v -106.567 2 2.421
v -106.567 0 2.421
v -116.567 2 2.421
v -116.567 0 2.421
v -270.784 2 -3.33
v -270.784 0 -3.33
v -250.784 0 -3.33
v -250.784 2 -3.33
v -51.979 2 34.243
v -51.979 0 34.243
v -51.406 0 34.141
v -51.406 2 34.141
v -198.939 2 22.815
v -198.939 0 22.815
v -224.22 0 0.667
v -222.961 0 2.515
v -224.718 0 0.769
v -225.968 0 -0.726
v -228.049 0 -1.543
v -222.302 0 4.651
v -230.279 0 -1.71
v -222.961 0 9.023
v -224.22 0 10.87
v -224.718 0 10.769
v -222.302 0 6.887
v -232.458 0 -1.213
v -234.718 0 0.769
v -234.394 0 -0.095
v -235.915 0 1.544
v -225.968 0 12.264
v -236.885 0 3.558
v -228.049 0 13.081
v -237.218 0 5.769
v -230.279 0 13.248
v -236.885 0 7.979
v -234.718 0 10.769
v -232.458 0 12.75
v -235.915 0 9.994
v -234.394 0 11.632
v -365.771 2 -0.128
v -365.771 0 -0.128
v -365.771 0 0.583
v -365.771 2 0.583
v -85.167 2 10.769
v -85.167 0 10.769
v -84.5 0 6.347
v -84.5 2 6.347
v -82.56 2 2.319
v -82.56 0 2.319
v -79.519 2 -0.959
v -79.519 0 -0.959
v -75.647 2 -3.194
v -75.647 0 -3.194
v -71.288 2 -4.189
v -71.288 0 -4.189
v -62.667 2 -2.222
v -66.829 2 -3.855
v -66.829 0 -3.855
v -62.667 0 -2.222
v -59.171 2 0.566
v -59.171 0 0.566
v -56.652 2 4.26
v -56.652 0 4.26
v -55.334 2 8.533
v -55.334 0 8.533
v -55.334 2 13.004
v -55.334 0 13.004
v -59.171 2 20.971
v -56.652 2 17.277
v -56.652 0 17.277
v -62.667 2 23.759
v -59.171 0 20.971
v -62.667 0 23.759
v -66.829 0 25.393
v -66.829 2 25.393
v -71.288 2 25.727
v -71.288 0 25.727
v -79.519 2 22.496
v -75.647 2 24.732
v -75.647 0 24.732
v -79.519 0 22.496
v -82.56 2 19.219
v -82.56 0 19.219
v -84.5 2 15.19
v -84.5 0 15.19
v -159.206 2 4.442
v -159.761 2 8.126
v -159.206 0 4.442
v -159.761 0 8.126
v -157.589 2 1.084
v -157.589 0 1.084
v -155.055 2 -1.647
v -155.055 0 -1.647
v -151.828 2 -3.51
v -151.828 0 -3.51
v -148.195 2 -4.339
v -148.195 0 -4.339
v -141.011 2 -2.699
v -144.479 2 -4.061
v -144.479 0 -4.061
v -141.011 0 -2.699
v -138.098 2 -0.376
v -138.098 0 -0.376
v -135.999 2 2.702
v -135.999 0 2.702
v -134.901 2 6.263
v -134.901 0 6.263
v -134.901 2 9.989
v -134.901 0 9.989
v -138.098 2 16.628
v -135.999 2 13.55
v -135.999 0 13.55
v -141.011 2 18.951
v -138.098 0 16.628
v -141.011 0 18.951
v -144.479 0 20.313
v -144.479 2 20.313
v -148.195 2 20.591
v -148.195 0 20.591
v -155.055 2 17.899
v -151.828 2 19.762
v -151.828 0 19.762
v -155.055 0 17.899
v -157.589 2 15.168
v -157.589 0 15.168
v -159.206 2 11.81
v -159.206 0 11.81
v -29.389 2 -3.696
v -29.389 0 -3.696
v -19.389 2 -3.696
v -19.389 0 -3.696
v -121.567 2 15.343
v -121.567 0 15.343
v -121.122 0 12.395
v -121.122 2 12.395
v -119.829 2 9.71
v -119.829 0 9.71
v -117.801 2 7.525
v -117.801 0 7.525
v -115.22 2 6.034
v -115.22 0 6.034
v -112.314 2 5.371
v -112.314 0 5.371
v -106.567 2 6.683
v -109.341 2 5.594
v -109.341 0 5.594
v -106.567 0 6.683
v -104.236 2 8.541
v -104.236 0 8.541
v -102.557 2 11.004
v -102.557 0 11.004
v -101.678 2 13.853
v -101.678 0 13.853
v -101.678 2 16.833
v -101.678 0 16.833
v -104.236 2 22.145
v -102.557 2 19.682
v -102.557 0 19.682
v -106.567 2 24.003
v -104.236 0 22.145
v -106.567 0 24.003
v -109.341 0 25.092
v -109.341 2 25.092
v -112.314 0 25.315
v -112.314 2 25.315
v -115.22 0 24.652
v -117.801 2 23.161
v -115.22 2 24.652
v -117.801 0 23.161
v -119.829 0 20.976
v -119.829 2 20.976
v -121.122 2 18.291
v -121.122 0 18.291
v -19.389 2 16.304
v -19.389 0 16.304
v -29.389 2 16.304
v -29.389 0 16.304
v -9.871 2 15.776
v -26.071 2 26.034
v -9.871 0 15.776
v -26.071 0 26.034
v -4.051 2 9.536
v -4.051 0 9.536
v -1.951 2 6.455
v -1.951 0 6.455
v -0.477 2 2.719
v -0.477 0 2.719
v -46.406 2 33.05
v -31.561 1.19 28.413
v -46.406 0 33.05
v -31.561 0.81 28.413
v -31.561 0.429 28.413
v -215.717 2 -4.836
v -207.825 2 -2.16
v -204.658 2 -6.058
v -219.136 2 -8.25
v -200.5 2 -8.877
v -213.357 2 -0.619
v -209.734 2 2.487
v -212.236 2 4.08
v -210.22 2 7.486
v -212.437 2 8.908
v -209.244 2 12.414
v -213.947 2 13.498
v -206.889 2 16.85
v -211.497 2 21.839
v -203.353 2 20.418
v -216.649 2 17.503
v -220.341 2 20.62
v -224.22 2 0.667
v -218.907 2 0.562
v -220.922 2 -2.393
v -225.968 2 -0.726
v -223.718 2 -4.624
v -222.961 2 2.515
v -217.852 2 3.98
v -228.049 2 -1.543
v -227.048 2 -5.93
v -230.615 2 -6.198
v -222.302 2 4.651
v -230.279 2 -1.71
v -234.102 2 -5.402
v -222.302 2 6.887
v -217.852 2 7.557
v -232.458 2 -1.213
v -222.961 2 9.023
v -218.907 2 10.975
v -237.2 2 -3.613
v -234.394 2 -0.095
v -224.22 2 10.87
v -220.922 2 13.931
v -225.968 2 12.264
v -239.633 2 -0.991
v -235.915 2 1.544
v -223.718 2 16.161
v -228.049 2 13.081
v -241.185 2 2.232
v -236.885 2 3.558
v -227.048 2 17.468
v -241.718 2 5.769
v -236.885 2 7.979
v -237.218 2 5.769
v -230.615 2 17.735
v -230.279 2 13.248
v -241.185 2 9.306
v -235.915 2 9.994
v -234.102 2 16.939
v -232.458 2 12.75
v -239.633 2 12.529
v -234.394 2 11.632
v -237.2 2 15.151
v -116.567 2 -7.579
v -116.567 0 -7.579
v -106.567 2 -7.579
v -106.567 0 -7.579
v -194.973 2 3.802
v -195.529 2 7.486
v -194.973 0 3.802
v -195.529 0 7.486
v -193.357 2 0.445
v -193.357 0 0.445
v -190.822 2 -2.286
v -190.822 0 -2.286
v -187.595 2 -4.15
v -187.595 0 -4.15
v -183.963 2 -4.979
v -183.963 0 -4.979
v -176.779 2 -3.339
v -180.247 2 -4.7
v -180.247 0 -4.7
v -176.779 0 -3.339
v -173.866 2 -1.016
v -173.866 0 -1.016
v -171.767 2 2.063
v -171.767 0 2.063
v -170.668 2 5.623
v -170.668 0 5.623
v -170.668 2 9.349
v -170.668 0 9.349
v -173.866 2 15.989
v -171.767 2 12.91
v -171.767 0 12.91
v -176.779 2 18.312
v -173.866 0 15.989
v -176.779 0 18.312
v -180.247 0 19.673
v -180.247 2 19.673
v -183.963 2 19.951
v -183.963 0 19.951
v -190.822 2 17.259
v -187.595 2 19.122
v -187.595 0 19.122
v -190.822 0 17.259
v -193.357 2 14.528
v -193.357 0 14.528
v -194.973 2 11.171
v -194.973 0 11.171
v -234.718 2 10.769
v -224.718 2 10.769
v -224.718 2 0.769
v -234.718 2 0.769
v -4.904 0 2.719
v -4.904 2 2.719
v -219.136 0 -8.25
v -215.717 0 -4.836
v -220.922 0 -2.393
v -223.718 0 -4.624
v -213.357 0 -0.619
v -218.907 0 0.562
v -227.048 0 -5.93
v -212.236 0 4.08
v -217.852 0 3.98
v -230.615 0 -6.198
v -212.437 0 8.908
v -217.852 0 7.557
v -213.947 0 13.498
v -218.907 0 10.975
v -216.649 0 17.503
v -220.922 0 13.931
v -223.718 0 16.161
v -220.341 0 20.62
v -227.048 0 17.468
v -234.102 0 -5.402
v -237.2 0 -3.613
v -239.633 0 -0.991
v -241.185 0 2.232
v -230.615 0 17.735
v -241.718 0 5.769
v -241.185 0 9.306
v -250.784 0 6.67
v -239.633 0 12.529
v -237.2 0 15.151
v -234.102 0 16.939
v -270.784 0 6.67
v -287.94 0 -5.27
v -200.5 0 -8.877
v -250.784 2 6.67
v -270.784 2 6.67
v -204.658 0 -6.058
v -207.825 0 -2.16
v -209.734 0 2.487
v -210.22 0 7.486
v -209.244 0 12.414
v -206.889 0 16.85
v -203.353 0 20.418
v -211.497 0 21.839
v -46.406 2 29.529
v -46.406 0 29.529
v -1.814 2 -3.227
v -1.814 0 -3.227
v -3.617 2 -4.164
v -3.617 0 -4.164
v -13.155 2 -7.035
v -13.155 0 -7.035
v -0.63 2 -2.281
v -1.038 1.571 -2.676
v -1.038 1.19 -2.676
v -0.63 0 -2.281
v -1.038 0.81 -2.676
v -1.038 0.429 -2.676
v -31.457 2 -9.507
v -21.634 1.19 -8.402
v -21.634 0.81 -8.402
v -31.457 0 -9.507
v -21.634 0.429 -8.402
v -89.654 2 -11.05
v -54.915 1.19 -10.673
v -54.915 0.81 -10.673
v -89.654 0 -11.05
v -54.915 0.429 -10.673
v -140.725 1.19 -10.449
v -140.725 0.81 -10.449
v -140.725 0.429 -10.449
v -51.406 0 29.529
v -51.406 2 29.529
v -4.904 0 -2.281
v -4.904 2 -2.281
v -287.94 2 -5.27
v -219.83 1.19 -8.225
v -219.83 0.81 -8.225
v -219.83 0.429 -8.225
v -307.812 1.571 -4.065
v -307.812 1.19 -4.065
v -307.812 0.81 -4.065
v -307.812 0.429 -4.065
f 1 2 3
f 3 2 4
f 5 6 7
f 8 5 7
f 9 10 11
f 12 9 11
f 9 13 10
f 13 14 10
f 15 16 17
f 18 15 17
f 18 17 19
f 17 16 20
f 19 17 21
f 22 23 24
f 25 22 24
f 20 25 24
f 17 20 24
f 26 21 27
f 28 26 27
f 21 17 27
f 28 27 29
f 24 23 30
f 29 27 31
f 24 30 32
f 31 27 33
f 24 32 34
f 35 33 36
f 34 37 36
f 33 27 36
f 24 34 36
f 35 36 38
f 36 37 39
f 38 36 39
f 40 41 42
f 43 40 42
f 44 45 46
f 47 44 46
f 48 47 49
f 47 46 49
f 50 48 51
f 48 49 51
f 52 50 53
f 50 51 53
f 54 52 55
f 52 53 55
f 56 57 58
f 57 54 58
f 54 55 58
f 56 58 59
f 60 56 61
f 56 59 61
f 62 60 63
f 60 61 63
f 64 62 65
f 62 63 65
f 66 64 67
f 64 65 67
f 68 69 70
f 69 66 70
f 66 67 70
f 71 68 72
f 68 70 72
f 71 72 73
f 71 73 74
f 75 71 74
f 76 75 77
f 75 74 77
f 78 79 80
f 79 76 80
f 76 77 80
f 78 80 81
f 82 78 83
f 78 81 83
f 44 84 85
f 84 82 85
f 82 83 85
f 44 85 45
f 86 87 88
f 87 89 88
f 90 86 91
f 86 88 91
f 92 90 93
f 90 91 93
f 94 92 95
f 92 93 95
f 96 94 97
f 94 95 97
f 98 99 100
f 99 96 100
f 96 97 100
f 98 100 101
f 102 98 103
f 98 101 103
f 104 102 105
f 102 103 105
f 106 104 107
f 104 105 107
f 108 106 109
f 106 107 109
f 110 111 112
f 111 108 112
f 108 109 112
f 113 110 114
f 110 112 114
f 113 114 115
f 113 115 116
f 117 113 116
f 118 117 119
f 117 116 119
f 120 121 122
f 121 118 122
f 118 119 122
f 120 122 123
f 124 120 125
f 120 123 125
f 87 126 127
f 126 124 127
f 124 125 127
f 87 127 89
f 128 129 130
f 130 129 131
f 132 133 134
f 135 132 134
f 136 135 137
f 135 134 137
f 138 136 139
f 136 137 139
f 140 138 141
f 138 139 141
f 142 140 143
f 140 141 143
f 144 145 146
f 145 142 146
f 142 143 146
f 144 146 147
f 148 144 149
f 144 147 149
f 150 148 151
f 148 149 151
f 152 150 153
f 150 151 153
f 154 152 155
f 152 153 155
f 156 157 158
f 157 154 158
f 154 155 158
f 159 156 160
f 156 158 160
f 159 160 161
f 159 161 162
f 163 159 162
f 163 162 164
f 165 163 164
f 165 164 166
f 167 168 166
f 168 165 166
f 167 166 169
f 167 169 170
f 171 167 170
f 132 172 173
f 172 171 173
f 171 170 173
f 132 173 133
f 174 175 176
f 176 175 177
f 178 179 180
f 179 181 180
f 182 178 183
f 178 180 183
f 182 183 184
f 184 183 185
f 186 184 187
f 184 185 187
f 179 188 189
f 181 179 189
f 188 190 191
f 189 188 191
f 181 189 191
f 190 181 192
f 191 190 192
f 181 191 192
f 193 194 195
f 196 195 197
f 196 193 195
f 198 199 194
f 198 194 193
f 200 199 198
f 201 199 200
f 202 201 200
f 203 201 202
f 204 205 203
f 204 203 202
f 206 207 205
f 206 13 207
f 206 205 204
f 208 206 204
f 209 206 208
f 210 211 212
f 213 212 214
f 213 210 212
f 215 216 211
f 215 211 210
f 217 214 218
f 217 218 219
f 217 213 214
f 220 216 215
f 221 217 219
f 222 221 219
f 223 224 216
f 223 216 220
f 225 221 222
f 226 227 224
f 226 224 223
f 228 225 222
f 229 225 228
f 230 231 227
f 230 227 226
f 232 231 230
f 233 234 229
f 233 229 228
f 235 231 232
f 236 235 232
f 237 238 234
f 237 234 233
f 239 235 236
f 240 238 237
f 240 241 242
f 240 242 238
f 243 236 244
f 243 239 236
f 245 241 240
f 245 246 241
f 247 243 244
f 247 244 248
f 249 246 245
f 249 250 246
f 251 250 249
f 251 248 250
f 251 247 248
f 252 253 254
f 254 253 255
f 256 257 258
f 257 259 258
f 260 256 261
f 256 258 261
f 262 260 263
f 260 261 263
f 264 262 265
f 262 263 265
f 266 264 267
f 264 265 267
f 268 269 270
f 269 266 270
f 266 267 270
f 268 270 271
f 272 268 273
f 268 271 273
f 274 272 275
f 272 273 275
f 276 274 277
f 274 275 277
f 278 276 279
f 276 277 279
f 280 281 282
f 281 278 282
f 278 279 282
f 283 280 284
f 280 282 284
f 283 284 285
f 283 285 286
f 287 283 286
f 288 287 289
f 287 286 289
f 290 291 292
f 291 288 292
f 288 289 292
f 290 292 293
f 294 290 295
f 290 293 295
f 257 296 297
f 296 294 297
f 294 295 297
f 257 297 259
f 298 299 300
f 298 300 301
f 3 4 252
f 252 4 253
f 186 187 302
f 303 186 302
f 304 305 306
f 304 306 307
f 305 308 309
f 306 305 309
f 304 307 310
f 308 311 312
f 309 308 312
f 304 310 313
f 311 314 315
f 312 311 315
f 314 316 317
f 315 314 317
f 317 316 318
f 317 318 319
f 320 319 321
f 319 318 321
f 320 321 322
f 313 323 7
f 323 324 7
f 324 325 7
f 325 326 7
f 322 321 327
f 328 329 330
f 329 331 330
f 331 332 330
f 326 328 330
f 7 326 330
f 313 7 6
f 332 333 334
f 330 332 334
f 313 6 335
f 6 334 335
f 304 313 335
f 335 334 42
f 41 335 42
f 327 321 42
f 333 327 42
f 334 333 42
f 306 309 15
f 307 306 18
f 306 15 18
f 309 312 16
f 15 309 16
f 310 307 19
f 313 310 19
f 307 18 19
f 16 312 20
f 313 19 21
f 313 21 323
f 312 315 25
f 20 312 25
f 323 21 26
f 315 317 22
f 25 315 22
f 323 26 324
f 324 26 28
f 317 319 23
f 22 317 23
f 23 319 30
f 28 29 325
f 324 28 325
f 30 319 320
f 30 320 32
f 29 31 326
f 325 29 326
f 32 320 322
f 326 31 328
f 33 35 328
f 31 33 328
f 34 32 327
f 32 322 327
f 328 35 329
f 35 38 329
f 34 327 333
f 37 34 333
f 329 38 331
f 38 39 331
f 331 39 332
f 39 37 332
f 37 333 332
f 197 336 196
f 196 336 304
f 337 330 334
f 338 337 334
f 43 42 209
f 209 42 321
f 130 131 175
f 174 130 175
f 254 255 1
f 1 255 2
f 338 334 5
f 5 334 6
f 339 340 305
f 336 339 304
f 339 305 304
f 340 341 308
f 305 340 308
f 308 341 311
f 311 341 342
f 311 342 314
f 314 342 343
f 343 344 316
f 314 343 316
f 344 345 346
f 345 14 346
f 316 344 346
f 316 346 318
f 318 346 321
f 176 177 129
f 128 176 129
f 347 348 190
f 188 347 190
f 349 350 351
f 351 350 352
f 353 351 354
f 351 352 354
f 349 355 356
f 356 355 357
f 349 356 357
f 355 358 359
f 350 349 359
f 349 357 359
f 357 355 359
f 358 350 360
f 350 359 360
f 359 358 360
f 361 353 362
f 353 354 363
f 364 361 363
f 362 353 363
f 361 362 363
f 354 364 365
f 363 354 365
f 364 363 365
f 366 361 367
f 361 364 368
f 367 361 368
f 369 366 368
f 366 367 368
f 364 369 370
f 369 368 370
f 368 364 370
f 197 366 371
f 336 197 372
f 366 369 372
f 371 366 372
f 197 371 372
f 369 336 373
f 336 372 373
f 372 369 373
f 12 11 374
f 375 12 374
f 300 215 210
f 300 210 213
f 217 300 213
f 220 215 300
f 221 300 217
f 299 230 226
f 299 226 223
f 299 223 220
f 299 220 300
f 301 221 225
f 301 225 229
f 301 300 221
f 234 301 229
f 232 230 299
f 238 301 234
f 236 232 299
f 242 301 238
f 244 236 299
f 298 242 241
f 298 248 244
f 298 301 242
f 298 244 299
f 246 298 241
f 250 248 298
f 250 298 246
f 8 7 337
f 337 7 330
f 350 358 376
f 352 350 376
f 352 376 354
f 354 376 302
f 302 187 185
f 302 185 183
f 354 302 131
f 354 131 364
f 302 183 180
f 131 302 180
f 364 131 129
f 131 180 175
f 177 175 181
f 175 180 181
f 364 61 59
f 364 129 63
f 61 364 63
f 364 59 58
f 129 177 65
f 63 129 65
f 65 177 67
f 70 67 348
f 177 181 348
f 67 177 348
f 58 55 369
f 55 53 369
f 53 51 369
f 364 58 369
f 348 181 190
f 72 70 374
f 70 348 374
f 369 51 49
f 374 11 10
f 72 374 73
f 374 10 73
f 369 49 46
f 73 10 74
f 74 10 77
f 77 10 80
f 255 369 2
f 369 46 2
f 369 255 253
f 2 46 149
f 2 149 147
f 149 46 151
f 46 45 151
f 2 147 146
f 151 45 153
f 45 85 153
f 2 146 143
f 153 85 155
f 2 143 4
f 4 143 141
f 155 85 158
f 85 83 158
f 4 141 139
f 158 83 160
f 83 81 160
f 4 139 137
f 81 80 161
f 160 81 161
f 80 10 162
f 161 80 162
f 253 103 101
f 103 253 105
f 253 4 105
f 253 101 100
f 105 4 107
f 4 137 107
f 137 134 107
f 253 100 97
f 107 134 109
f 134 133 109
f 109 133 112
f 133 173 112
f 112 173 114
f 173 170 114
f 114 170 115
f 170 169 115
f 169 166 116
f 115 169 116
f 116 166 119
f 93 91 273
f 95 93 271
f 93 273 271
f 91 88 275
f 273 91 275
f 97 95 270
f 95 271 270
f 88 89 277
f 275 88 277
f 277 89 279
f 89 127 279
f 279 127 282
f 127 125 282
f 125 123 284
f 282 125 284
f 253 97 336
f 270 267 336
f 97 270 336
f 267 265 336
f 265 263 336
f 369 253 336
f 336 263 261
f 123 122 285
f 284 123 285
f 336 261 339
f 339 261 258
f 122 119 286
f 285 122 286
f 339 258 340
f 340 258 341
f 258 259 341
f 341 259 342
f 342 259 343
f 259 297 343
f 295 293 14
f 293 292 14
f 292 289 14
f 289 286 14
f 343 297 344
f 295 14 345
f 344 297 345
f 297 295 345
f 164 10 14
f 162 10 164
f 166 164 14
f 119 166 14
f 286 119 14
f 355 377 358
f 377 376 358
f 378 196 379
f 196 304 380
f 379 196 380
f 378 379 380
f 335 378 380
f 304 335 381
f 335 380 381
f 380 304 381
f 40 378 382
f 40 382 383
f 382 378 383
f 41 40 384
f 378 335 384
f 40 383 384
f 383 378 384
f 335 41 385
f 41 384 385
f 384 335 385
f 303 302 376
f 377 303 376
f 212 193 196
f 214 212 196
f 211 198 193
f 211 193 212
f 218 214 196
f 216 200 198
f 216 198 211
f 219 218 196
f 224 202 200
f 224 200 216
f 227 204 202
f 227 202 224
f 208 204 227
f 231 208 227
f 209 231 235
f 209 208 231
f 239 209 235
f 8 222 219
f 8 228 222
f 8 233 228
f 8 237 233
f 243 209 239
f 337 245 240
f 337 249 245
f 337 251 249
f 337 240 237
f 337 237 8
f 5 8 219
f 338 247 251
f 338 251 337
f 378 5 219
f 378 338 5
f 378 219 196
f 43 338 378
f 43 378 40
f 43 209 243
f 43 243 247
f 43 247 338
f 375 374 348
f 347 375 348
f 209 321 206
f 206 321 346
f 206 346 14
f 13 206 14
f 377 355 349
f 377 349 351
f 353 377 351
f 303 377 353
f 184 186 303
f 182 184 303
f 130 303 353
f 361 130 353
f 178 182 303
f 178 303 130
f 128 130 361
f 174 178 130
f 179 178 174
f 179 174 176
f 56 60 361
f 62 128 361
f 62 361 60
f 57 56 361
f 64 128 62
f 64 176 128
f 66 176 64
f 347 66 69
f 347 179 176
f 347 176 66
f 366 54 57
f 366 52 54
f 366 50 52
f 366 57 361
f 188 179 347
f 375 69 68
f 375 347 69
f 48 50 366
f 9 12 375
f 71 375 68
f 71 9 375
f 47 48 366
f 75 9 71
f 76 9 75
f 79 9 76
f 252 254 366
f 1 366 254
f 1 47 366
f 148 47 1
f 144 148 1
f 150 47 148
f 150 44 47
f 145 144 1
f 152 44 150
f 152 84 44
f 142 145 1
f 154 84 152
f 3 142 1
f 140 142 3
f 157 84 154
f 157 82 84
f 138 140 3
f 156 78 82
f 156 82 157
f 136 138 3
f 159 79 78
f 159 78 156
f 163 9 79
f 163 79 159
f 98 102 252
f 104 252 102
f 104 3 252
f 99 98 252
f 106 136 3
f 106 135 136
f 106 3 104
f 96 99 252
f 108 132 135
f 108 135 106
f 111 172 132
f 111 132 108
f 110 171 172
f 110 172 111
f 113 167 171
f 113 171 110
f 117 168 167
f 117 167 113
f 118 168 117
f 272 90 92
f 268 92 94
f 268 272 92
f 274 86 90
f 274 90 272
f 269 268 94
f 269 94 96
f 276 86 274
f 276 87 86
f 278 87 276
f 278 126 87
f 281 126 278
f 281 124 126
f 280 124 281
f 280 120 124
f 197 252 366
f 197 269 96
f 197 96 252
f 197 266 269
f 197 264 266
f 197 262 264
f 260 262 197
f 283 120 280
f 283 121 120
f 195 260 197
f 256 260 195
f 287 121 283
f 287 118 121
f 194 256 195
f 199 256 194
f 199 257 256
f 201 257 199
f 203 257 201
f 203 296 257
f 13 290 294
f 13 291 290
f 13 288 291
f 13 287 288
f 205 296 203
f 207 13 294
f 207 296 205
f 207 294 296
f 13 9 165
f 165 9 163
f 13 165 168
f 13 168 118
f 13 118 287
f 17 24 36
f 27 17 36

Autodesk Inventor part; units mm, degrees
ref_plane "YZ Plane" through (0, 0, 0) normal (1, 0, 0) x (0, 1, 0)
ref_plane "XZ Plane" through (0, 0, 0) normal (0, 1, 0) x (-1, 0, 0)
ref_plane "XY Plane" through (0, 0, 0) normal (0, 0, 1) x (1, 0, 0)
sketch "Sketch1" plane through (0, 0, 0) normal (0, 1, 0) x (-1, 0, 0)
  spline S0 degree 4 poles (51.979, 34.2431) (49.1051, 33.7566) (39.5332, 31.5872) (30.1137, 28.1904) (19.6059, 22.8943) (13.0923, 18.5073) (7.8605, 14.3051) (3.9363, 9.4088) (1.5106, 6.3896) (0.0434, 1.3996) (-0.032, 0.3871) (0.028, -0.8915) (0.1768, -1.4854) (0.3983, -2.0441) (0.8215, -2.5037) (1.3408, -2.946) (2.6667, -3.7655) (3.7155, -4.2634) (10.6098, -6.747) (15.9249, -7.4764) (25.5133, -9.1262) (35.8155, -9.8616) (48.4495, -10.5455) (62.4279, -10.8762) (77.9663, -11.0677) (94.722, -11.0635) (112.5613, -10.9225) (131.2432, -10.6462) (150.5553, -10.2615) (170.2642, -9.7779) (190.1377, -9.2151) (209.9398, -8.5807) (229.4366, -7.8911) (248.3971, -7.1484) (266.6047, -6.3637) (283.8414, -5.5226) (299.9482, -4.5961) (314.7433, -3.6129) (328.1612, -2.6484) (339.8268, -1.769) (350.012, -1.0496) (357.5866, -0.5225) (364.806, -0.1794) (367.4848, -0.031) (370.1657, -0.0078) (369.9872, 0.0018) knots 0 0 0 0 0 0.056172 0.079777 0.102171 0.123272 0.142974 0.16113 0.176202 0.188392 0.197687 0.204488 0.210696 0.216571 0.223012 0.230232 0.240513 0.254518 0.272366 0.294434 0.318911 0.345468 0.373865 0.403873 0.435249 0.467749 0.501146 0.535218 0.569752 0.604537 0.639365 0.674029 0.708317 0.742021 0.774934 0.806859 0.837599 0.866942 0.894636 0.920358 0.943684 0.964014 0.980302 1 1 1 1 1
  circle A0 centre (370, 0) radius 160 construction
  line L0 (370, 0) -> (211.4974, 21.8387)
  circle A1 centre (211.4974, 21.8387) radius 160 construction
  line L1 (211.4974, 21.8387) -> (51.979, 34.2431)
  circle A2 centre (112.1091, -11.9485) radius 9.25 construction
  line L2 (19.3886, 16.3045) -> (29.3886, 16.3045)
  line L3 (29.3886, 16.3045) -> (29.3886, -3.6955)
  line L4 (29.3886, -3.6955) -> (19.3886, -3.6955)
  line L5 (19.3886, -3.6955) -> (19.3886, 16.3045)
  line L6 (250.7844, 6.67) -> (270.7844, 6.67)
  line L7 (270.7844, 6.67) -> (270.7844, -3.33)
  line L8 (270.7844, -3.33) -> (250.7844, -3.33)
  line L9 (250.7844, -3.33) -> (250.7844, 6.67)
  line L10 (-0.096, 2.719) -> (4.904, 2.719)
  line L11 (4.904, 2.719) -> (4.904, -2.281)
  line L12 (4.904, -2.281) -> (-0.096, -2.281)
  line L13 (-0.096, -2.281) -> (-0.096, 2.719)
  circle A3 centre (369.9872, 0.0018) radius 3 construction
  line L14 (365.7713, 2.7478) -> (370.7713, 2.7478)
  line L15 (370.7713, 2.7478) -> (370.7713, -2.2522)
  line L16 (370.7713, -2.2522) -> (365.7713, -2.2522)
  line L17 (365.7713, -2.2522) -> (365.7713, 2.7478)
  line L18 (211.4974, 21.8387) -> (210.0997, -8.5616) construction
  arc A4 (200.5005, -8.8773) -> (198.939, 22.8152) centre (193.0135, 6.6385) ccw
  arc A5 (220.3414, 20.6201) -> (219.1363, -8.2496) centre (229.7182, 5.7687) ccw
  line L19 (224.7182, 10.7687) -> (234.7182, 10.7687)
  line L20 (234.7182, 10.7687) -> (234.7182, 0.7687)
  line L21 (234.7182, 0.7687) -> (224.7182, 0.7687)
  line L22 (224.7182, 0.7687) -> (224.7182, 10.7687)
  line L23 (224.7182, 10.7687) -> (234.7182, 0.7687) construction
  line L24 (234.7182, 10.7687) -> (224.7182, 0.7687) construction
  circle A6 centre (229.7182, 5.7687) radius 7.5
  line L25 (46.4065, 34.5291) -> (51.4065, 34.5291)
  line L26 (51.4065, 34.5291) -> (51.4065, 29.5291)
  line L27 (51.4065, 29.5291) -> (46.4065, 29.5291)
  line L28 (46.4065, 29.5291) -> (46.4065, 34.5291)
  line L29 (46.4065, 34.5291) -> (51.4065, 29.5291) construction
  line L30 (51.4065, 34.5291) -> (46.4065, 29.5291) construction
  circle A7 centre (229.7182, 5.7687) radius 12
  line L31 (106.5666, 2.4214) -> (116.5666, 2.4214)
  line L32 (116.5666, 2.4214) -> (116.5666, -7.5786)
  line L33 (116.5666, -7.5786) -> (106.5666, -7.5786)
  line L34 (106.5666, -7.5786) -> (106.5666, 2.4214)
  line L35 (106.5666, 2.4214) -> (116.5666, -7.5786) construction
  line L36 (116.5666, 2.4214) -> (106.5666, -7.5786) construction
  line L37 (243.8053, 20.8885) -> (169.6091, 20.8885) construction
  line L38 (169.6091, 20.8885) -> (169.6091, 2.3885) construction
  line L39 (358.8053, 63.2604) -> (243.8053, 63.2604) construction
  line L40 (243.8053, 63.2604) -> (243.8053, 20.8885) construction
  line L41 (243.8053, 20.8885) -> (169.6091, 2.3885) construction
  line L42 (169.6091, 20.8885) -> (243.8053, 63.2604) construction
  circle A8 centre (70.1669, 10.7687) radius 15
  circle A9 centre (147.2609, 8.126) radius 12.5
  circle A10 centre (111.5666, 15.343) radius 10
  circle A11 centre (183.0287, 7.4864) radius 12.5
  point P0 (0, 0)
  point P1 (370, 0)
  point P2 (35.937, 30.0257)
  point P3 (27.0238, 26.4761)
  point P4 (19.2974, 22.4624)
  point P5 (12.8156, 18.139)
  point P6 (7.6237, 13.6489)
  point P7 (3.7499, 9.1521)
  point P8 (1.2115, 4.8535)
  point P9 (0.0668, 1.0195)
  point P10 (0.0003, -0.0638)
  point P11 (0.0755, -0.9849)
  point P12 (0.2106, -1.5356)
  point P13 (0.4302, -2.0122)
  point P14 (0.7739, -2.4345)
  point P15 (1.2488, -2.8423)
  point P16 (2.1566, -3.4383)
  point P17 (3.2773, -4.0196)
  point P18 (8.2772, -5.8071)
  point P19 (15.3669, -7.4261)
  point P20 (24.3167, -8.7706)
  point P21 (35.0526, -9.7678)
  point P22 (47.5438, -10.4262)
  point P23 (61.6814, -10.8267)
  point P24 (77.2847, -11.0213)
  point P25 (94.162, -11.0379)
  point P26 (112.1091, -10.9014)
  point P27 (130.911, -10.6315)
  point P28 (150.3435, -10.2474)
  point P29 (170.176, -9.7646)
  point P30 (190.1737, -9.1986)
  point P31 (229.7182, -7.8653)
  point P32 (248.7963, -7.1166)
  point P33 (267.1071, -6.3194)
  point P34 (284.4371, -5.4606)
  point P35 (300.619, -4.5258)
  point P36 (315.5184, -3.5432)
  point P37 (328.988, -2.5786)
  point P38 (340.8625, -1.7041)
  point P39 (350.9622, -0.9861)
  point P40 (359.0984, -0.4682)
  point P41 (365.0855, -0.1602)
  point P42 (368.7597, -0.0285)
  point P43 (370, 0)
  point P44 (0.4773, 2.719)
  point P45 (0.6305, -2.281)
  point P46 (365.7713, -0.1283)
  point P47 (368.4073, 0.2194)
  point P48 (48.9065, 32.0291)
  point P49 (111.5666, -2.5786)
  point P50 (365.7713, 0.5826)
  point P51 (51.4065, 34.1414)
  point P52 (46.4065, 33.0501)
  dimension "d5" = 160
  dimension "d8" = 160
  dimension "d10" = 18.5
  dimension "d11" = 10
  dimension "d12" = 20
  dimension "d13" = 20
  dimension "d14" = 10
  dimension "d17" = 5
  dimension "d18" = 5
  dimension "d25" = 6
  dimension "d26" = 5
  dimension "d27" = 5
  dimension "d30" = 17.2278
  dimension "d33" = 10
  dimension "d34" = 10
  dimension "d35" = 15
  dimension "d36" = 5
  dimension "d37" = 5
  dimension "d41" = 24
  dimension "d42" = 10
  dimension "d43" = 10
  dimension "d47" = 115
  dimension "d48" = 18.5
  dimension "d49" = 104.4854
  dimension "d50" = 368.7594
  dimension "d51" = 30
  dimension "d52" = 25
  dimension "d53" = 20
  dimension "d54" = 25
extrude "Extrusion3" add sketch "Sketch1" along normal blind 2 contours A4 L1 L0 A5 S0 | S0 L12 L11 L10 L28 L27 L26 L1 A4 | A5 L0 L17 S0 | L19 L20 L21 L22 | A6 | A7
properties part number "airfoil"
